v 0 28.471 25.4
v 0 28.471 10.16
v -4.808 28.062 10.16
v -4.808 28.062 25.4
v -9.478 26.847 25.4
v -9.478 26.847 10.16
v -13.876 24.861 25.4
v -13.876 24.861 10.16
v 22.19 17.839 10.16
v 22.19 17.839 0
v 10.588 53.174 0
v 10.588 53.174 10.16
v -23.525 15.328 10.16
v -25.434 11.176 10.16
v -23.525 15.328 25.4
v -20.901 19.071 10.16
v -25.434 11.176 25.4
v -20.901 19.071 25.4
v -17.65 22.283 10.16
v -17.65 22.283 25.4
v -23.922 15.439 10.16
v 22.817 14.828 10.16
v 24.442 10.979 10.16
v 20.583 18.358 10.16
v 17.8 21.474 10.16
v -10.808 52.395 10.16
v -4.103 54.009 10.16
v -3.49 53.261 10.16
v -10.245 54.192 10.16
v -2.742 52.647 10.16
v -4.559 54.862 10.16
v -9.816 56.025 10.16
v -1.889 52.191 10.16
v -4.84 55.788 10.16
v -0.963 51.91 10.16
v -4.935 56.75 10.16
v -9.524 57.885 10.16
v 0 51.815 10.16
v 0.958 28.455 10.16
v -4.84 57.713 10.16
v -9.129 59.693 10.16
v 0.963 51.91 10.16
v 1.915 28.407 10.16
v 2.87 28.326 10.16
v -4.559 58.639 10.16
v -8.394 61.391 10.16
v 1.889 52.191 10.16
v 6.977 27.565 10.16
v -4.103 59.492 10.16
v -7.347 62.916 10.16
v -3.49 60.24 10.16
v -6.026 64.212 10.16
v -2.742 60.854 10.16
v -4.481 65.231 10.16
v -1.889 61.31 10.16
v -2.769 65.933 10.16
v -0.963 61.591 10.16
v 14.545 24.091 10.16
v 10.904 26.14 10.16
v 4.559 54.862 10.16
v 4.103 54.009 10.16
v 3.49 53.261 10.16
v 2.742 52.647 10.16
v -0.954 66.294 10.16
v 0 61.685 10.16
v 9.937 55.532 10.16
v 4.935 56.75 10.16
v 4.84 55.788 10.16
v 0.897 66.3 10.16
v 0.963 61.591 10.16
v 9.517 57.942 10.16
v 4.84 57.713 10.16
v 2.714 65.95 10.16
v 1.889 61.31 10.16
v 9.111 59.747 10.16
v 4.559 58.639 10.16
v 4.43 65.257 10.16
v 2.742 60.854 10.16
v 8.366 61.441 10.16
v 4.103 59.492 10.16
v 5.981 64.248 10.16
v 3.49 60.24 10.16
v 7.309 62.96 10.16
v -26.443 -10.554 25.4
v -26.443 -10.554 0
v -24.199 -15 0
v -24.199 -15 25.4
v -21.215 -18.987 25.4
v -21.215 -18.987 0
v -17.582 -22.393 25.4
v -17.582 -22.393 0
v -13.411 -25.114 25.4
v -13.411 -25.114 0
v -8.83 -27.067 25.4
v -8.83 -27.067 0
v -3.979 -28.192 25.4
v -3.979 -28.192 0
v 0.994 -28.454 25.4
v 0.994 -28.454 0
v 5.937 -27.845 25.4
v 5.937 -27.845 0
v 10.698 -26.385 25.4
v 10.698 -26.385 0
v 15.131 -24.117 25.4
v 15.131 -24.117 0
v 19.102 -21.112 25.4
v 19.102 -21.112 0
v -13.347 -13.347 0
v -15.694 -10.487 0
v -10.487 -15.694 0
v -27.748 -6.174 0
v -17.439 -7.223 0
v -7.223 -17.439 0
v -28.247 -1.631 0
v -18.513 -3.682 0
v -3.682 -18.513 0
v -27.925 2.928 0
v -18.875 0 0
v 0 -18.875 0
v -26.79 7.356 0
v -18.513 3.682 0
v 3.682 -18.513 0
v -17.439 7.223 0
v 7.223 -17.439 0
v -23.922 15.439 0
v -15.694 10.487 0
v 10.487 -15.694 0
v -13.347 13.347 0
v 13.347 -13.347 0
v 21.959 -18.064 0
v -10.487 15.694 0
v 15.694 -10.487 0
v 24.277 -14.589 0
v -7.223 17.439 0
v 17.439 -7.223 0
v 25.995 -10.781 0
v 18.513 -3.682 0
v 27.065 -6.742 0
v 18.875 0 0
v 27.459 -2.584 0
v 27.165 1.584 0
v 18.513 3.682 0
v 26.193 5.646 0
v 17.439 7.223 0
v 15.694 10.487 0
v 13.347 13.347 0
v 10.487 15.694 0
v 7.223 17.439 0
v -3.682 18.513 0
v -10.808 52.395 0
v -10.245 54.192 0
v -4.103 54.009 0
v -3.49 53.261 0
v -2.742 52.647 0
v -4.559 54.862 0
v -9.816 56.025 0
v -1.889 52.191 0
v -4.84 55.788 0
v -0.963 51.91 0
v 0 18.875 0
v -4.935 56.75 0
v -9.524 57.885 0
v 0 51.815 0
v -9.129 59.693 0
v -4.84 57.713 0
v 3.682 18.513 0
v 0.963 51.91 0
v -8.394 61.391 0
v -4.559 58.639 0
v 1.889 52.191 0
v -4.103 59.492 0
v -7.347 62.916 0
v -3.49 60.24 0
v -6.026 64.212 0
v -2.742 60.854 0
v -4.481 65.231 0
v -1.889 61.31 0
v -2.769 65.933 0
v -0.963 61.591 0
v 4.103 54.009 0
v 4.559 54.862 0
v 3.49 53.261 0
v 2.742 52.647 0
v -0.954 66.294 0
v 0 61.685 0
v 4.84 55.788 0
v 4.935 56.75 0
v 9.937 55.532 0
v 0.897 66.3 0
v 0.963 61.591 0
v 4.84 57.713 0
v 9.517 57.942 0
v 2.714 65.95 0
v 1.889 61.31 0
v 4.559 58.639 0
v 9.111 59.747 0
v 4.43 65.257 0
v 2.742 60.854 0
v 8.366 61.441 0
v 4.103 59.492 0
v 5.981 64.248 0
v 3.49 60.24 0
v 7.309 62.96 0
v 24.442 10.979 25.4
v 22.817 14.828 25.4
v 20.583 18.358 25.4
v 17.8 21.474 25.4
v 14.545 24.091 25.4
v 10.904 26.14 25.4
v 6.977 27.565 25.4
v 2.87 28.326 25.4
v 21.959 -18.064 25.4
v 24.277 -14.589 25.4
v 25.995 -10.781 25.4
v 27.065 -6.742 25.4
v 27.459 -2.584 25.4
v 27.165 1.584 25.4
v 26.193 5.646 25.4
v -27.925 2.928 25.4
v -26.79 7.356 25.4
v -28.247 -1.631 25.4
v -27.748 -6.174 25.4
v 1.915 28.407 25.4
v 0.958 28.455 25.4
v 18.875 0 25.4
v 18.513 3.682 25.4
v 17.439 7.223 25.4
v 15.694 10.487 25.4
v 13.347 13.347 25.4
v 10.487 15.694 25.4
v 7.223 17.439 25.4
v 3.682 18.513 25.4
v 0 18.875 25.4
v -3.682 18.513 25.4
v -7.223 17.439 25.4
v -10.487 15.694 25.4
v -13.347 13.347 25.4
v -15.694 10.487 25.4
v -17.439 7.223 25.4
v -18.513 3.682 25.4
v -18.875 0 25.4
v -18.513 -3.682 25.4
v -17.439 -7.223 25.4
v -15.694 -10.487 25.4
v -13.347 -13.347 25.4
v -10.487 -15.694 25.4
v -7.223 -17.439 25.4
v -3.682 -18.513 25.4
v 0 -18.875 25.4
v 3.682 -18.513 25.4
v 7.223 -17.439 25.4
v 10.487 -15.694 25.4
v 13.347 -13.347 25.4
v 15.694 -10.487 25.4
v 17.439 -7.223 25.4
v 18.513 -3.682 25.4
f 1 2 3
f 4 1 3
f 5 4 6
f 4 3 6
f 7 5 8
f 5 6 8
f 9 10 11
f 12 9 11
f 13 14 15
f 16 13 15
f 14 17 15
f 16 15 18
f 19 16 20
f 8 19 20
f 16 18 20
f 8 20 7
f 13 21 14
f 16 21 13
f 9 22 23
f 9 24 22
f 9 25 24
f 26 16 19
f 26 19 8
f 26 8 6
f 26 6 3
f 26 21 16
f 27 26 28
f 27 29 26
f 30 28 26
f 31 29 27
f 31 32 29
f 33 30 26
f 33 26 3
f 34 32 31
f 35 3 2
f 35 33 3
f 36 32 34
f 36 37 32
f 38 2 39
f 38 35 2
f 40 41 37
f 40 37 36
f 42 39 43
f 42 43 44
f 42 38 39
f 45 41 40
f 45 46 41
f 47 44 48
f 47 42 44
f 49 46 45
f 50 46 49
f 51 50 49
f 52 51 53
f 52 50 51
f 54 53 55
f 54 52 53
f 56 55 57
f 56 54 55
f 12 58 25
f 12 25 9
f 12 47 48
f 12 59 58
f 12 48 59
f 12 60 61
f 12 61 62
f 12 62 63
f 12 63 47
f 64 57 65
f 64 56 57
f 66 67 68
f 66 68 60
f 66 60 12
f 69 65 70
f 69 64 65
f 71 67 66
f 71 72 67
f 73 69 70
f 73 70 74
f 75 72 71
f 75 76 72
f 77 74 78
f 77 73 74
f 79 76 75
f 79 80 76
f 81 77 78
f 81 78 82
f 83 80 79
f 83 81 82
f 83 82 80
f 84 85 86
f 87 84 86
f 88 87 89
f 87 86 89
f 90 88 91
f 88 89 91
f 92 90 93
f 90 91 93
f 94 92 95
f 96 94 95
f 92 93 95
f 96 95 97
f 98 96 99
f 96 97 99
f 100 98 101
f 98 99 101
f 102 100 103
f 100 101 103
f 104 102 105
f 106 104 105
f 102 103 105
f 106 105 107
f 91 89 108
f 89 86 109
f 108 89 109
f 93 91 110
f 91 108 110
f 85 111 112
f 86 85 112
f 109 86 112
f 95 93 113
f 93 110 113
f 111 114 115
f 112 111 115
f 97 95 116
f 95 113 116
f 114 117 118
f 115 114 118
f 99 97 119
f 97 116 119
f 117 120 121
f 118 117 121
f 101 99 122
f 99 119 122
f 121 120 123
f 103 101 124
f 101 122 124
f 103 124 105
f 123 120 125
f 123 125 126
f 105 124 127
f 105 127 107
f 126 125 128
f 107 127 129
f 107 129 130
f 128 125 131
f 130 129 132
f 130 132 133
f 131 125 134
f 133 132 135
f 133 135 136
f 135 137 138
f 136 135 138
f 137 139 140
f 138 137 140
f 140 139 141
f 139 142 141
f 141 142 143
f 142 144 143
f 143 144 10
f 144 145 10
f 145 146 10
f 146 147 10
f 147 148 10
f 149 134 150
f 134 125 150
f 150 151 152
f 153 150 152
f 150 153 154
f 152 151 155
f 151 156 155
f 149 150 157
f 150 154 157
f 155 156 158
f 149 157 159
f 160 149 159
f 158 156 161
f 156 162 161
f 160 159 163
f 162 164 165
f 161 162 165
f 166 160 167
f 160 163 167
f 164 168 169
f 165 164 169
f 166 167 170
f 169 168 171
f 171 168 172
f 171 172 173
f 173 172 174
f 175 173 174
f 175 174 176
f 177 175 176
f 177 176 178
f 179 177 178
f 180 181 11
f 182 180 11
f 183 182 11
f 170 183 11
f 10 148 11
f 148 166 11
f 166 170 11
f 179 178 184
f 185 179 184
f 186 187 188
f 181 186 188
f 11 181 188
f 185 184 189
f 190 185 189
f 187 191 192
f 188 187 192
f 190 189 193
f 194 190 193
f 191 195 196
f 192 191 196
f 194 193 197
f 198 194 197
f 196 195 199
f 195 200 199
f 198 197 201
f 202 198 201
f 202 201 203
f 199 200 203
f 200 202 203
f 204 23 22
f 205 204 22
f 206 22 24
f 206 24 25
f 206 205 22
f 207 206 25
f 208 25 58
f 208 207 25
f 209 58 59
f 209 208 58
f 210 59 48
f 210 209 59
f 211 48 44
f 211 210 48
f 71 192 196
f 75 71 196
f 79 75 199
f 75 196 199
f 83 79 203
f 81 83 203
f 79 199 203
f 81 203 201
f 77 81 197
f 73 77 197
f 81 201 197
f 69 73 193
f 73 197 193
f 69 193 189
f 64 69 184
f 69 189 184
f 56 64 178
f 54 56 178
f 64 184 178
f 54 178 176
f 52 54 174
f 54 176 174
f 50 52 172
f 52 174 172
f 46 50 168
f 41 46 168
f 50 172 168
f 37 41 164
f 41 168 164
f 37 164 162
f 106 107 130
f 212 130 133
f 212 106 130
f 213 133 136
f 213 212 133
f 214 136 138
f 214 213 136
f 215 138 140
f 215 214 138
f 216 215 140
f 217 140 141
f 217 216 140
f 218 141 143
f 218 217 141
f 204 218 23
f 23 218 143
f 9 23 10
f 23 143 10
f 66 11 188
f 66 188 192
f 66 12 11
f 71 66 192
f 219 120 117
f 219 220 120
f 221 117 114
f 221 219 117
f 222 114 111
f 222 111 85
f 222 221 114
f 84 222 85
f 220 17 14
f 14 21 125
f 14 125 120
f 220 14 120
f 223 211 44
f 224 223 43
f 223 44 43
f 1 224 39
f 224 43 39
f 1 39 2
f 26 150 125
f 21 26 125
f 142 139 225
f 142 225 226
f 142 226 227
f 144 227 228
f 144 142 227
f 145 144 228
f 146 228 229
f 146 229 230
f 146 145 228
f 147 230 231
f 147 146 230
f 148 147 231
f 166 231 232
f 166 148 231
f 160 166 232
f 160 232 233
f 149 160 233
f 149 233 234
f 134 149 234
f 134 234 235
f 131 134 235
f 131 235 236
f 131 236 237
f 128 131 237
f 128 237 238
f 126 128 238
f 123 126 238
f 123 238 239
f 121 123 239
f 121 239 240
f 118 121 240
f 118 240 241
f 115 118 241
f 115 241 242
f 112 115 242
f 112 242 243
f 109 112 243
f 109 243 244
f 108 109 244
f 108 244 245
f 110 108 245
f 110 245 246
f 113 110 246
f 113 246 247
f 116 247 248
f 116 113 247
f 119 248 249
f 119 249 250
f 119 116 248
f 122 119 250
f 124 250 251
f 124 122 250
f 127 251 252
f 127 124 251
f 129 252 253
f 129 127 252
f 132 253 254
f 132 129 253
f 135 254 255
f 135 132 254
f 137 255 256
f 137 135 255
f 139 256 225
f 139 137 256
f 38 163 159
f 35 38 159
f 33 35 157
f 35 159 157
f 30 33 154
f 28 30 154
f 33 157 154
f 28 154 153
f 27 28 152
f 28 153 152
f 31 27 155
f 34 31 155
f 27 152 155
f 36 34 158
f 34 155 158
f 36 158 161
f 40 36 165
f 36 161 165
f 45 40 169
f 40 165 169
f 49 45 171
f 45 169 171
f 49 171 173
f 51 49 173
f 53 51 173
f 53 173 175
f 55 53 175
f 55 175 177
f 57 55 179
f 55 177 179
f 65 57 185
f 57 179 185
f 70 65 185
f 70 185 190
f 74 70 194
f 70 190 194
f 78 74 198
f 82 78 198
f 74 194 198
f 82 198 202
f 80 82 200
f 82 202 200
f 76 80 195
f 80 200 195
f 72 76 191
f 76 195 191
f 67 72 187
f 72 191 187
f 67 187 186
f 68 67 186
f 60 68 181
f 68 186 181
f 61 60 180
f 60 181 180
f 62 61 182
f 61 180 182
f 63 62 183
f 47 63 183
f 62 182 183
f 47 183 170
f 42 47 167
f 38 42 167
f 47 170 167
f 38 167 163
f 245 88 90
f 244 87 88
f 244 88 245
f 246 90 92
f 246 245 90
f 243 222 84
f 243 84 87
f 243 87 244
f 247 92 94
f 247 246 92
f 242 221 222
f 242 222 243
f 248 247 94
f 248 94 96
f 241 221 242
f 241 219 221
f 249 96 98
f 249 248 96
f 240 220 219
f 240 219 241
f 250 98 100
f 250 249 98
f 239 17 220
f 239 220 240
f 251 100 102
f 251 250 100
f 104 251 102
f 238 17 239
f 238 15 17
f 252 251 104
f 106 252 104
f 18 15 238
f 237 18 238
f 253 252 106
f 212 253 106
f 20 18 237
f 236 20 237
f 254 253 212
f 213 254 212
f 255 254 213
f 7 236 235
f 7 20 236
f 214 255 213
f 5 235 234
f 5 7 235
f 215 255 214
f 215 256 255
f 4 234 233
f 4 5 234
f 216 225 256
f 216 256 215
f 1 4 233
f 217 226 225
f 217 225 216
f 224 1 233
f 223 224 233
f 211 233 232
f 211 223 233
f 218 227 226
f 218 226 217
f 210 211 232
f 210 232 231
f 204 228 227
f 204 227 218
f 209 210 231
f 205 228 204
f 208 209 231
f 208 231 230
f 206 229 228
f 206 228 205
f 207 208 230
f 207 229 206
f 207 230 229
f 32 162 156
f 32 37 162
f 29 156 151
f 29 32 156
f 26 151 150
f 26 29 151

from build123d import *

# Parameters (mm, degrees)
F0_R     = 18.875359
F1_DEPTH = 25.4
F2_DEPTH = 10.16
F3_R     = 25.4


with BuildPart() as f1:
    # F0 (on Top) → F1 (new body)
    with BuildSketch(Plane.XY):
        with BuildLine():
            Line((-23.921628, 15.438856), (-28.302625, 3.09257))
            ThreePointArc((-28.302625, 3.09257), (-2.154046, -28.389482), (28.445225, -1.213161))
            Line((28.445225, -1.213161), (22.189711, 17.838703))
            ThreePointArc((22.189711, 17.838703), (12.302751, 25.675764), (0, 28.471083))
            ThreePointArc((0, 28.471083), (-13.620602, 25.001635), (-23.921628, 15.438856))
        make_face()
        Circle(F0_R, mode=Mode.SUBTRACT)
    extrude(amount=F1_DEPTH)

    # F0 (on Top) → F2 (join)
    with BuildSketch(Plane.XY):
        with BuildLine():
            Line((-23.921628, 15.438856), (-28.302625, 3.09257))
            ThreePointArc((-28.302625, 3.09257), (-2.154046, -28.389482), (28.445225, -1.213161))
            Line((28.445225, -1.213161), (22.189711, 17.838703))
            ThreePointArc((22.189711, 17.838703), (12.302751, 25.675764), (0, 28.471083))
            ThreePointArc((0, 28.471083), (-13.620602, 25.001635), (-23.921628, 15.438856))
        make_face()
        Circle(F0_R, mode=Mode.SUBTRACT)
        with BuildLine():
            Line((-9.555586, 55.924454), (-23.921628, 15.438856))
            ThreePointArc((-23.921628, 15.438856), (-13.620602, 25.001635), (0, 28.471083))
            Line((0, 28.471083), (0, 47.159142))
            ThreePointArc((0, 47.159142), (-6.483439, 49.682373), (-9.555586, 55.924454))
        make_face()
        with BuildLine():
            ThreePointArc((0, 28.471083), (12.302751, 25.675764), (22.189711, 17.838703))
            Line((22.189711, 17.838703), (9.578088, 56.248801))
            ThreePointArc((9.578088, 56.248801), (6.602304, 49.793277), (0, 47.159142))
            Line((0, 47.159142), (0, 28.471083))
        make_face()
        with BuildLine():
            ThreePointArc((4.935129, 56.750353), (-3.489663, 60.240017), (0, 51.815224))
            ThreePointArc((0, 51.815224), (3.489663, 53.26069), (4.935129, 56.750353))
        make_face()
        with BuildLine():
            ThreePointArc((9.591211, 56.750353), (-0.413334, 66.332654), (-9.555586, 55.924454))
            ThreePointArc((-9.555586, 55.924454), (-6.483439, 49.682373), (0, 47.159142))
            ThreePointArc((0, 47.159142), (6.602304, 49.793277), (9.578088, 56.248801))
            ThreePointArc((9.578088, 56.248801), (9.58793, 56.499491), (9.591211, 56.750353))
        make_face()
        with BuildLine():
            ThreePointArc((4.935129, 56.750353), (3.489663, 53.26069), (0, 51.815224))
            ThreePointArc((0, 51.815224), (-3.489663, 60.240017), (4.935129, 56.750353))
        make_face(mode=Mode.SUBTRACT)
    extrude(amount=F2_DEPTH)

    # F3
    f3_edges = [f1.edges().sort_by_distance(p)[0] for p in [
        (22.189711, 17.838703, 17.78),
        (28.445225, -1.213161, 12.7),
        (9.578088, 56.248801, 5.08),
        (-9.555586, 55.924454, 5.08),
        (-28.302625, 3.09257, 12.7),
        (-23.921628, 15.438856, 17.78),
    ]]
    fillet(f3_edges, radius=F3_R)


solid = f1.part
